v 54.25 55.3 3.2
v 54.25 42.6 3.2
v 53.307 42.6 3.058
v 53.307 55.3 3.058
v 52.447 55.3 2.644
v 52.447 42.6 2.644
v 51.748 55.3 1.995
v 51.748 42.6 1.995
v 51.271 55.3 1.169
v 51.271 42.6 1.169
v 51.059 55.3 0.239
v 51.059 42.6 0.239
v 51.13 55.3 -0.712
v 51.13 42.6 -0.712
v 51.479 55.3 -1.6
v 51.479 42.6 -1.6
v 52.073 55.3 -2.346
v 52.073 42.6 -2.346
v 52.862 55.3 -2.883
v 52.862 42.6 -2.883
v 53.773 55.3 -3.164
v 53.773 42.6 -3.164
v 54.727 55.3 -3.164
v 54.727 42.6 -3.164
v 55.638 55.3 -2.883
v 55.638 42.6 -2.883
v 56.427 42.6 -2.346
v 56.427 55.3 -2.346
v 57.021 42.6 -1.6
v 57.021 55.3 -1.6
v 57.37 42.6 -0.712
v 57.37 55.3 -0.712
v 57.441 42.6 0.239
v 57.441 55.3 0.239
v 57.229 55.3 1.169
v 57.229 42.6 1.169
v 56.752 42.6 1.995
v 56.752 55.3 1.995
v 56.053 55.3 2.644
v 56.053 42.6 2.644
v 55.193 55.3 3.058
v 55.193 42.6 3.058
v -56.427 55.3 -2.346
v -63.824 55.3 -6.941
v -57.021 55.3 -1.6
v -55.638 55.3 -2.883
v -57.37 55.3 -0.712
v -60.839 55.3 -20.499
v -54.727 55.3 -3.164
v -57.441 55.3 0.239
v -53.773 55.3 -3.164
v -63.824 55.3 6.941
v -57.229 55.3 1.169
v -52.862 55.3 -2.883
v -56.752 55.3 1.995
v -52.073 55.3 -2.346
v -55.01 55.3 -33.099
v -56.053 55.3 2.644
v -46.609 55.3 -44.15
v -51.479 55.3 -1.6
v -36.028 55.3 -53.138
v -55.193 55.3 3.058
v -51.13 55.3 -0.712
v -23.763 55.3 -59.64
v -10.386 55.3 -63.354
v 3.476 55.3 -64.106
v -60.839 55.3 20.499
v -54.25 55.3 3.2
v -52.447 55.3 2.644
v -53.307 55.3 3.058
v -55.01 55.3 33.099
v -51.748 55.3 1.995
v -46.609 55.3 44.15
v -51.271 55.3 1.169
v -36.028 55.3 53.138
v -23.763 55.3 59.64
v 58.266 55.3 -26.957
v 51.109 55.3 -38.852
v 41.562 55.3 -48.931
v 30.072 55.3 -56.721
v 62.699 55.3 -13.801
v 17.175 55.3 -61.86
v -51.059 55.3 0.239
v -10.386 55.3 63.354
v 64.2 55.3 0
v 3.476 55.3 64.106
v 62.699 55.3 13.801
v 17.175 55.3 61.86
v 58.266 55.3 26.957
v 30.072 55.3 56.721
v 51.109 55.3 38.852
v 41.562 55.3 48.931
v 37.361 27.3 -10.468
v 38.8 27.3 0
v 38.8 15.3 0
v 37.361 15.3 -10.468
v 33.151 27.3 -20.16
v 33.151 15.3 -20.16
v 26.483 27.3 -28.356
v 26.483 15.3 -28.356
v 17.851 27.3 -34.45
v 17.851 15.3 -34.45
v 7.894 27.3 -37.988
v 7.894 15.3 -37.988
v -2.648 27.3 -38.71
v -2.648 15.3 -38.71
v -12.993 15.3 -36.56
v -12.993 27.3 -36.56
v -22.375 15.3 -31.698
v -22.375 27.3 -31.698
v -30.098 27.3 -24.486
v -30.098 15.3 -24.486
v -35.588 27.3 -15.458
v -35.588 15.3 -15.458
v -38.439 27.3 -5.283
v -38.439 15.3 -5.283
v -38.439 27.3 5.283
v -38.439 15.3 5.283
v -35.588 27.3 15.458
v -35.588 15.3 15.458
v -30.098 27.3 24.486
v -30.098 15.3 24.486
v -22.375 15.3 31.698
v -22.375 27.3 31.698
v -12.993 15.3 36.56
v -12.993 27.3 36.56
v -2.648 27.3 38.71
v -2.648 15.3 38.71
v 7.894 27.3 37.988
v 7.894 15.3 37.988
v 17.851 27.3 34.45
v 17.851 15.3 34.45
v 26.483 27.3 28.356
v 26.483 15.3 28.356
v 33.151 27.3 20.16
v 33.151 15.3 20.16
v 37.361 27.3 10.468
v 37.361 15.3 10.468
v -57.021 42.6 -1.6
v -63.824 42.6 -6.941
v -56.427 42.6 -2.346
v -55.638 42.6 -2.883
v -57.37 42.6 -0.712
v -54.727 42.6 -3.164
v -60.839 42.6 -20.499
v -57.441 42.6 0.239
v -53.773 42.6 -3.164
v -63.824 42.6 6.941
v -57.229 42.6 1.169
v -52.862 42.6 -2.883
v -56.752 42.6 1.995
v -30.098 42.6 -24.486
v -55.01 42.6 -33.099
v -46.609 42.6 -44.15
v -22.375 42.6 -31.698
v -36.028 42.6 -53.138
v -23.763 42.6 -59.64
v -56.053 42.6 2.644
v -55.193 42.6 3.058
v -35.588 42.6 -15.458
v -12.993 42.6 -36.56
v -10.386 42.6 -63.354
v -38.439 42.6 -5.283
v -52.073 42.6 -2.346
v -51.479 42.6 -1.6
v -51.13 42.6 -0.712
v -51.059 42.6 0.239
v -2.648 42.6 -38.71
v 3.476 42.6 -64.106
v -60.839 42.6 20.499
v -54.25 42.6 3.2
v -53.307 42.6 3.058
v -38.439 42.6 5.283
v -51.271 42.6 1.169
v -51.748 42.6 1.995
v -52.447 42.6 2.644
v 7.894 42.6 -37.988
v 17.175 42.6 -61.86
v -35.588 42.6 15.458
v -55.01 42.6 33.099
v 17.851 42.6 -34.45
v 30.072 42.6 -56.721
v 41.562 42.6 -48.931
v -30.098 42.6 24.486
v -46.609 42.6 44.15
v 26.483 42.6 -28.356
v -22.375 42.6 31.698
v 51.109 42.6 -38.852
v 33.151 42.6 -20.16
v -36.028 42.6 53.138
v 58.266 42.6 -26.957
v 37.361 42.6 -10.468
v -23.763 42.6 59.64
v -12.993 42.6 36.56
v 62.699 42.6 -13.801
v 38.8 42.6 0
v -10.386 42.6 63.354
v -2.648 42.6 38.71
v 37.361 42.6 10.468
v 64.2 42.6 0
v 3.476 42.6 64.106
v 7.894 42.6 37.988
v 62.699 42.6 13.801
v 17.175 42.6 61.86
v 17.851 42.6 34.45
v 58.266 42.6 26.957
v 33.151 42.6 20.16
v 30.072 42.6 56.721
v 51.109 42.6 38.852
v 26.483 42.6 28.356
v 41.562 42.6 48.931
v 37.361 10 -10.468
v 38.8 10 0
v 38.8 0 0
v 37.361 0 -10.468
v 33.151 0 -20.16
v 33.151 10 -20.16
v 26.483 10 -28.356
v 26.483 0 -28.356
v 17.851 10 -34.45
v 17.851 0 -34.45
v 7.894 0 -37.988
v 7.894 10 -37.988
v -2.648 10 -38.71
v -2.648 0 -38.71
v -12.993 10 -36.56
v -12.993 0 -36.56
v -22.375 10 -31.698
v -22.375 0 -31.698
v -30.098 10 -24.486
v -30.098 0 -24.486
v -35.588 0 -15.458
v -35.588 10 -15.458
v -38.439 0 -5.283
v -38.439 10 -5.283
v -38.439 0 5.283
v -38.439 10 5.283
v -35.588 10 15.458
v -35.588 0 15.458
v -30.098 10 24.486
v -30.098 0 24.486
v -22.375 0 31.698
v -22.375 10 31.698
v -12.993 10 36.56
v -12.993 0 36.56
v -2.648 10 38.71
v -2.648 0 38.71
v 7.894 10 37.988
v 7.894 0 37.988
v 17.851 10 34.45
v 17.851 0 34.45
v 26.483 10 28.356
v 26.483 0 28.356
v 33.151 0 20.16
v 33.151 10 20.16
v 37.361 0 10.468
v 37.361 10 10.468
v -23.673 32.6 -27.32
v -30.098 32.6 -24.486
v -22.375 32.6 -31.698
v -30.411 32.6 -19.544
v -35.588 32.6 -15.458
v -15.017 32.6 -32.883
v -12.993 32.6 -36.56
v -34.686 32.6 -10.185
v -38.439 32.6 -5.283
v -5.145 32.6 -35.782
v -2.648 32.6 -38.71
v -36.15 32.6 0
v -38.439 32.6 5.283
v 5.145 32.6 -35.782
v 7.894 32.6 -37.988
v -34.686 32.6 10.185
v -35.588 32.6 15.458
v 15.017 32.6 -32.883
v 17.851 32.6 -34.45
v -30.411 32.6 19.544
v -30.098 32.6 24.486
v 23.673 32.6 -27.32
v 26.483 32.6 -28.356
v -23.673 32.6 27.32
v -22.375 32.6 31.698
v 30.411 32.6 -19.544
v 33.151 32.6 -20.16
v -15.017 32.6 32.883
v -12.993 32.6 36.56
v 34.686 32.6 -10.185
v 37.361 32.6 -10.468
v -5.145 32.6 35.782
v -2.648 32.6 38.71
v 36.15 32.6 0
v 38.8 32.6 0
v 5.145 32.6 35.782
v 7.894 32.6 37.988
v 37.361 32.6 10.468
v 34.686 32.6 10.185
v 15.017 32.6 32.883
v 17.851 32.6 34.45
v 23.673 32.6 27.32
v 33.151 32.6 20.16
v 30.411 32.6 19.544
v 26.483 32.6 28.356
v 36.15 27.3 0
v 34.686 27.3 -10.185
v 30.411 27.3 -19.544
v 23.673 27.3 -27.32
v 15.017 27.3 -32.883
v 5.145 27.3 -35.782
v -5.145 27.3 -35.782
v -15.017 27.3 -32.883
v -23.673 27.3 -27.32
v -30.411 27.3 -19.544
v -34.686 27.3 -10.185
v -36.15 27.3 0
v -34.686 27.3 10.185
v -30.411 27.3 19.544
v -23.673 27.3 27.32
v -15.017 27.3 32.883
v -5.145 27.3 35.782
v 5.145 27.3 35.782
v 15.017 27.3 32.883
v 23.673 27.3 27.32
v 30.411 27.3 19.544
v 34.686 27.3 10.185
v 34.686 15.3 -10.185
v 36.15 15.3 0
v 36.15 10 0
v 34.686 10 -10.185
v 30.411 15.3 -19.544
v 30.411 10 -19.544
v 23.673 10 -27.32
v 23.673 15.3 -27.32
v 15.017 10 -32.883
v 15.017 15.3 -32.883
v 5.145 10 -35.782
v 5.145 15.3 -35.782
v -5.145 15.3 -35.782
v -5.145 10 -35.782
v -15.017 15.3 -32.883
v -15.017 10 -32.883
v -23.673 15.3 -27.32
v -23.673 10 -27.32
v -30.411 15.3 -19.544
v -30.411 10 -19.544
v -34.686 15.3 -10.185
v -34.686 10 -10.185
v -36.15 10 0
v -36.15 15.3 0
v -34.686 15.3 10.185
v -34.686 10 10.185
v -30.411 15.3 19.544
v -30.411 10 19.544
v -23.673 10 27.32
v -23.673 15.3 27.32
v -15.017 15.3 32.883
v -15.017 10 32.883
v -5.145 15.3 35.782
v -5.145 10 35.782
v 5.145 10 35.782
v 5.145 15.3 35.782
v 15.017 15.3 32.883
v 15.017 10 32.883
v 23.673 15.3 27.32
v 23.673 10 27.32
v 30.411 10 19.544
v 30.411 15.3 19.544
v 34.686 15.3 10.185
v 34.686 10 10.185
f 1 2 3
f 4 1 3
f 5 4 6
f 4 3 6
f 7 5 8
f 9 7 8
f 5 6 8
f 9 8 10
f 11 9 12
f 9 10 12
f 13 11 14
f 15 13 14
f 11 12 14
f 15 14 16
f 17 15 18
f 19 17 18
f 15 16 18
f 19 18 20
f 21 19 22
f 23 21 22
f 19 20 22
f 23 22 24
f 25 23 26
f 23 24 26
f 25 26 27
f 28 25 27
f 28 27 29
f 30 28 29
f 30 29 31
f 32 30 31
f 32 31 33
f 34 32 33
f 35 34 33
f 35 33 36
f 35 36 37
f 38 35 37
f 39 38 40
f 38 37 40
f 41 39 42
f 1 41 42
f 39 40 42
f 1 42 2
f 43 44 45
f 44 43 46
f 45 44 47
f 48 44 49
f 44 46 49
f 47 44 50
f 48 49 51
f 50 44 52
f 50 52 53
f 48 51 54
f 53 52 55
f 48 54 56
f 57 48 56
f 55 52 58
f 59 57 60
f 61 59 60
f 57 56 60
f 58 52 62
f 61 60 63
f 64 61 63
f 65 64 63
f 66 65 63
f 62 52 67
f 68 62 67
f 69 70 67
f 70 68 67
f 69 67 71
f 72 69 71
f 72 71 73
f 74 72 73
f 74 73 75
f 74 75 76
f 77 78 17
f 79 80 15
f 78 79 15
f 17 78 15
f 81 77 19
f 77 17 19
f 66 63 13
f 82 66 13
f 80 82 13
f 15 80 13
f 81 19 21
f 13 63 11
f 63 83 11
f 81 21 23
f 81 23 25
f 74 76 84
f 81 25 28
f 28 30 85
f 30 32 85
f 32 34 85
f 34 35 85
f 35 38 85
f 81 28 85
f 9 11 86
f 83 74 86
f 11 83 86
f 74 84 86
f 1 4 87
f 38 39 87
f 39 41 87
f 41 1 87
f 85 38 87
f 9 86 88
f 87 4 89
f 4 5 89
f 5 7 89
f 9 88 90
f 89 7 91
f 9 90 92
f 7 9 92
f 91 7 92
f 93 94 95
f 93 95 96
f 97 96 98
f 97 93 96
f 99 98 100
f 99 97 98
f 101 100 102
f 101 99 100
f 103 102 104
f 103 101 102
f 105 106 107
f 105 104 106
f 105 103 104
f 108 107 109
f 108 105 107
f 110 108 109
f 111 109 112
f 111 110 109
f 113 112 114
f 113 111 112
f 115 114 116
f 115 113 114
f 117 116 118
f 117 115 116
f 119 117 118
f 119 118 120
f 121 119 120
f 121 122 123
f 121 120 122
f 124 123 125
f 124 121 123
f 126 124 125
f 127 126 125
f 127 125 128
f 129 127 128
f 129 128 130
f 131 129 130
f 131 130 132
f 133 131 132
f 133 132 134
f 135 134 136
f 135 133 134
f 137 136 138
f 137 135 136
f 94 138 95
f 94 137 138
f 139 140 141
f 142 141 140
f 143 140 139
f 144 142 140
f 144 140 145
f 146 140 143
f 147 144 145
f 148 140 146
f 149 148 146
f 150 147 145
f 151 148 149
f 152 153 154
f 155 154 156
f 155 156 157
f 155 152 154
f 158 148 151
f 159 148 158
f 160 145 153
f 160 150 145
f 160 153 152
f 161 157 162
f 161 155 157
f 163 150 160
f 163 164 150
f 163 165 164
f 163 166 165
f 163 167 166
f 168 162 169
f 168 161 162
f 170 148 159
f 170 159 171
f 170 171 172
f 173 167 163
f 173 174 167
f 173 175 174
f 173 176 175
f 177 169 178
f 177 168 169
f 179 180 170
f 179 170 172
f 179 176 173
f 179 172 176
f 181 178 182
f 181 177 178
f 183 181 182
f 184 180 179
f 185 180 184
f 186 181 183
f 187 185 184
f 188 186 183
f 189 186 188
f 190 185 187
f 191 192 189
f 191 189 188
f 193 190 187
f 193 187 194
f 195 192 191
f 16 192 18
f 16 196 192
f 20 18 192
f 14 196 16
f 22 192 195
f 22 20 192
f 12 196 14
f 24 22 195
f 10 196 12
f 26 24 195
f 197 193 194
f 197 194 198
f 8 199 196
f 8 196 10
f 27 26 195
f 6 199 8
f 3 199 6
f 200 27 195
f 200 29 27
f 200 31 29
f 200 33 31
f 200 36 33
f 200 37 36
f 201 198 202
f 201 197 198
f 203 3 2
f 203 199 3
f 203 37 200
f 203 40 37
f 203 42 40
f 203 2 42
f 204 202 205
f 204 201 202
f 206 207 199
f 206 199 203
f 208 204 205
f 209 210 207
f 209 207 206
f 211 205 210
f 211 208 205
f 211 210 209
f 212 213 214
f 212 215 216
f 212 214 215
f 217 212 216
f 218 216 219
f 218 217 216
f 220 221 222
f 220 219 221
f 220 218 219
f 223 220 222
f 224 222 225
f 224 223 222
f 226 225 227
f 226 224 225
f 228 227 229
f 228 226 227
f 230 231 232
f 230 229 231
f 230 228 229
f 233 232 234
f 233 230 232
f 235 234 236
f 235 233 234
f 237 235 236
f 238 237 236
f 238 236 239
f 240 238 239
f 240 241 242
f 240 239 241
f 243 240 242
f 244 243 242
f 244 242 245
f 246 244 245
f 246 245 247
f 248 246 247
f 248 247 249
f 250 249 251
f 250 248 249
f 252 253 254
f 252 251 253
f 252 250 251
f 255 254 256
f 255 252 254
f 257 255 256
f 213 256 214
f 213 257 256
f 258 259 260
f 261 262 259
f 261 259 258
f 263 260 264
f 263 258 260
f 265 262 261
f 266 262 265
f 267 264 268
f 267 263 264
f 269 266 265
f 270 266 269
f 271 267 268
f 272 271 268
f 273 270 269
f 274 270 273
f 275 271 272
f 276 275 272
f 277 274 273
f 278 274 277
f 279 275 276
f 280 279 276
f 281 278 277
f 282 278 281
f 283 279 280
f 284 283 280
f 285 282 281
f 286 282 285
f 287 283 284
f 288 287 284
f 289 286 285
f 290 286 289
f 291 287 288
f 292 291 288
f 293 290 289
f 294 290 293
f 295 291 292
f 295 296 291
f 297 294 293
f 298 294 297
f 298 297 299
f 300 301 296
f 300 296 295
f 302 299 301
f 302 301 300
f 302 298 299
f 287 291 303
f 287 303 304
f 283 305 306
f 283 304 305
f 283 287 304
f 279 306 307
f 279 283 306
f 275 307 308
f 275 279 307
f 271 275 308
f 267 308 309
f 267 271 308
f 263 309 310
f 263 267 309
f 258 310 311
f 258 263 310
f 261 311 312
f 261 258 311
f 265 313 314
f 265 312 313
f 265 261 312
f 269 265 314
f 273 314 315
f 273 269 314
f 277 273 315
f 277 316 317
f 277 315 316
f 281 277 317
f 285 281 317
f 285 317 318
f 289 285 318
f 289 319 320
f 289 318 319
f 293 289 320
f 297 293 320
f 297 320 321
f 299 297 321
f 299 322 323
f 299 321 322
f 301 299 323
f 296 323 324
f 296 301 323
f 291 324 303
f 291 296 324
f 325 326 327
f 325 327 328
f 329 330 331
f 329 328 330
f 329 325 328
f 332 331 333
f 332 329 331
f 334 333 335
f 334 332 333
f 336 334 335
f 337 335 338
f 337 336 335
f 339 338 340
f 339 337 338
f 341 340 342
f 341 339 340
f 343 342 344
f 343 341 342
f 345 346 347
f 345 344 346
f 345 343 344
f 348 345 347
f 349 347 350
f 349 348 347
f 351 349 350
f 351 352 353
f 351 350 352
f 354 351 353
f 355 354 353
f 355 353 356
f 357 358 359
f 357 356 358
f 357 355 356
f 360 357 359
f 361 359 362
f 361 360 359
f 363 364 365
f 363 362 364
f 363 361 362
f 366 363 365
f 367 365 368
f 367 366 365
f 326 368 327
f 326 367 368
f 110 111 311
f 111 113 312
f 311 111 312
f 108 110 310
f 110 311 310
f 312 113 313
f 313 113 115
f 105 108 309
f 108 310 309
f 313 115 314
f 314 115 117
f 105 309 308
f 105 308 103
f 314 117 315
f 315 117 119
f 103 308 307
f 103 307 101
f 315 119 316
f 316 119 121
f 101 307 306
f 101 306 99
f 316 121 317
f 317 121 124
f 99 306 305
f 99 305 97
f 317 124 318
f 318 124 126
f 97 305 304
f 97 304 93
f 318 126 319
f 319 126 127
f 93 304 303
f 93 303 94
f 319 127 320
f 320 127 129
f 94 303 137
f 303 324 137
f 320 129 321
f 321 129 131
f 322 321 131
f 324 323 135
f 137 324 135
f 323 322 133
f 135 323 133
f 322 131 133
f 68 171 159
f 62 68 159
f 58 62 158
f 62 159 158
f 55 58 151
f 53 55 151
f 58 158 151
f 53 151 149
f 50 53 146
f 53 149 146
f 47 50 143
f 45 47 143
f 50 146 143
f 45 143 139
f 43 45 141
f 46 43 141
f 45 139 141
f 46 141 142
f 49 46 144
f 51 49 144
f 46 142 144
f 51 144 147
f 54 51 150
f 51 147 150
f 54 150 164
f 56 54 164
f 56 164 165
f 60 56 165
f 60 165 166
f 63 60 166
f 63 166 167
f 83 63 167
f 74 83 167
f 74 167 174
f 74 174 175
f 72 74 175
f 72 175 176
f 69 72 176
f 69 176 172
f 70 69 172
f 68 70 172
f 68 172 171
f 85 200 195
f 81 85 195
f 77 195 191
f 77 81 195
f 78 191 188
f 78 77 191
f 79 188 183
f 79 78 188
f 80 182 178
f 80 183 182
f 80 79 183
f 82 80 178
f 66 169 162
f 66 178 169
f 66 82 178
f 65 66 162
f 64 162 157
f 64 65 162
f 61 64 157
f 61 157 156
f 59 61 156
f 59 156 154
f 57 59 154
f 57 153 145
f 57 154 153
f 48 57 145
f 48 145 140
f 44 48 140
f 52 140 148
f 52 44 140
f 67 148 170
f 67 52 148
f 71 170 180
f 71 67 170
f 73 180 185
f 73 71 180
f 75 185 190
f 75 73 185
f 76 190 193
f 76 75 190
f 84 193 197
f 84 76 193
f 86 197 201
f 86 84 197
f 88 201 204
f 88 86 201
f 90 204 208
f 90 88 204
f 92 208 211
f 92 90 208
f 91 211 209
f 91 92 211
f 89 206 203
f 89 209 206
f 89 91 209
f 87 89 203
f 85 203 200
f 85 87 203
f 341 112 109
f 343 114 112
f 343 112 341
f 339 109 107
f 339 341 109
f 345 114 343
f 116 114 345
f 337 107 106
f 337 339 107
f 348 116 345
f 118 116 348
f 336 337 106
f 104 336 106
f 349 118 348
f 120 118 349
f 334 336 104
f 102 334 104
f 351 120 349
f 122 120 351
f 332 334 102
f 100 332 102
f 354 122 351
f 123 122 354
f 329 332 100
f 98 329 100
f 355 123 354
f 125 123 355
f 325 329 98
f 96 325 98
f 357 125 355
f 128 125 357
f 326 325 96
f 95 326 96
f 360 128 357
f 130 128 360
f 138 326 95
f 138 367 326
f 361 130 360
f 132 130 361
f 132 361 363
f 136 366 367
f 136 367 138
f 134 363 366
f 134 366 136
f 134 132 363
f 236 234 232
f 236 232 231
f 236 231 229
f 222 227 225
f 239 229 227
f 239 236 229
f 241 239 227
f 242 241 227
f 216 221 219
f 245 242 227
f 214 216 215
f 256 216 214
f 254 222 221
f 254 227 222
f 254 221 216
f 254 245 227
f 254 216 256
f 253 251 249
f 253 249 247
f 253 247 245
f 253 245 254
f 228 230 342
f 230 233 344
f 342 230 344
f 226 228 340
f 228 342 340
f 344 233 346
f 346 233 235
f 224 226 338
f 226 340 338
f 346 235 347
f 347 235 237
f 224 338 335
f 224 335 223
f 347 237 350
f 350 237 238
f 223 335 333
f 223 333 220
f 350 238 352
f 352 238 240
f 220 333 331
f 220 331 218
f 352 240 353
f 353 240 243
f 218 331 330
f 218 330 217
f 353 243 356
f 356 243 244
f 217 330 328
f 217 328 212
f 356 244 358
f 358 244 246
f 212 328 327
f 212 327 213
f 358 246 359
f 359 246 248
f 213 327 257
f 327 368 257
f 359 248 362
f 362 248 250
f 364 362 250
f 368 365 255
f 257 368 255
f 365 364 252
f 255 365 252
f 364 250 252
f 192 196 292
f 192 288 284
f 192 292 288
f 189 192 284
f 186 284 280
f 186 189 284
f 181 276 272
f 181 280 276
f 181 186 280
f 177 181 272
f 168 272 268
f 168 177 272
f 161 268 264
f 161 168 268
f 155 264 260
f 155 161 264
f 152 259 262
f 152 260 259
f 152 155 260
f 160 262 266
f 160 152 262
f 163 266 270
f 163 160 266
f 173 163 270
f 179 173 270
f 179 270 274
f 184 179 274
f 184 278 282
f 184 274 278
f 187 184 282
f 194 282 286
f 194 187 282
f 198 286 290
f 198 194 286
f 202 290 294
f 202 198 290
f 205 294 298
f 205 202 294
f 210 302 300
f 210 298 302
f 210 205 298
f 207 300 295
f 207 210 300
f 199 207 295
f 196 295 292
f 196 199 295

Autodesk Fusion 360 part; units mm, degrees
sketch "Sketch1" plane through (0, 0, 0) normal (0, 0, 1) x (1, 0, 0)
  line L0 (0, 0) -> (38.8, 0)
  line L1 (38.8, 0) -> (38.8, 10)
  line L2 (38.8, 10) -> (36.15, 10)
  line L3 (36.15, 10) -> (36.15, 15.3)
  line L4 (36.15, 15.3) -> (38.8, 15.3)
  line L5 (38.8, 15.3) -> (38.8, 27.3)
  line L6 (38.8, 27.3) -> (36.15, 27.3)
  line L7 (36.15, 27.3) -> (36.15, 32.6)
  line L8 (36.15, 32.6) -> (38.8, 32.6)
  line L9 (38.8, 32.6) -> (38.8, 42.6)
  line L10 (38.8, 42.6) -> (64.2, 42.6)
  line L11 (64.2, 42.6) -> (64.2, 55.3)
  line L12 (64.2, 55.3) -> (0, 55.3)
  line L13 (0, 55.3) -> (0, 0)
  dimension "d1" = 38.8
  dimension "d2" = 10
  dimension "d3" = 2.65
  dimension "d4" = 5.3
  dimension "d5" = 2.65
  dimension "d7" = 12
  dimension "d8" = 2.65
  dimension "d9" = 5.3
  dimension "d10" = 2.65
  dimension "d11" = 10
  dimension "d12" = 25.4
  dimension "d13" = 12.7
revolve "Revolve1" add sketch "Sketch1" angle 360 about axis through (0, 55.3, 0) along (0, -1, 0)
sketch "Sketch2" plane through (0, 55.3, 0) normal (0, 1, 0) x (-1, 0, 0)
  circle A0 centre (0, 0) radius 64.2
sketch "Sketch3" plane through (0, 55.3, 0) normal (0, 1, 0) x (-1, 0, 0)
  line L0 (-51.05, 0) -> (-54.25, 0)
  circle A0 centre (-54.25, 0) radius 3.2
  line L1 (51.05, 0) -> (54.25, 0)
  circle A1 centre (54.25, 0) radius 3.2
  dimension "d15" = 54.25
  dimension "d16" = 6.4
  dimension "d17" = 54.25
  dimension "d18" = 6.4
hole "Hole1" at (54.25, 55.3, 0) direction (0, -1, 0) diameter 6.4 depth 100 tip angle 118
sketch "Sketch4" plane through (0, 55.3, 0) normal (0, 1, 0) x (-1, 0, 0)
  line L0 (51.05, 0) -> (54.25, 0)
  circle A0 centre (54.25, 0) radius 3.2
  dimension "d22" = 54.25
  dimension "d23" = 6.4
hole "Hole2" at (-54.25, 55.3, 0) direction (0, -1, 0) diameter 6.4 depth 100 tip angle 118
